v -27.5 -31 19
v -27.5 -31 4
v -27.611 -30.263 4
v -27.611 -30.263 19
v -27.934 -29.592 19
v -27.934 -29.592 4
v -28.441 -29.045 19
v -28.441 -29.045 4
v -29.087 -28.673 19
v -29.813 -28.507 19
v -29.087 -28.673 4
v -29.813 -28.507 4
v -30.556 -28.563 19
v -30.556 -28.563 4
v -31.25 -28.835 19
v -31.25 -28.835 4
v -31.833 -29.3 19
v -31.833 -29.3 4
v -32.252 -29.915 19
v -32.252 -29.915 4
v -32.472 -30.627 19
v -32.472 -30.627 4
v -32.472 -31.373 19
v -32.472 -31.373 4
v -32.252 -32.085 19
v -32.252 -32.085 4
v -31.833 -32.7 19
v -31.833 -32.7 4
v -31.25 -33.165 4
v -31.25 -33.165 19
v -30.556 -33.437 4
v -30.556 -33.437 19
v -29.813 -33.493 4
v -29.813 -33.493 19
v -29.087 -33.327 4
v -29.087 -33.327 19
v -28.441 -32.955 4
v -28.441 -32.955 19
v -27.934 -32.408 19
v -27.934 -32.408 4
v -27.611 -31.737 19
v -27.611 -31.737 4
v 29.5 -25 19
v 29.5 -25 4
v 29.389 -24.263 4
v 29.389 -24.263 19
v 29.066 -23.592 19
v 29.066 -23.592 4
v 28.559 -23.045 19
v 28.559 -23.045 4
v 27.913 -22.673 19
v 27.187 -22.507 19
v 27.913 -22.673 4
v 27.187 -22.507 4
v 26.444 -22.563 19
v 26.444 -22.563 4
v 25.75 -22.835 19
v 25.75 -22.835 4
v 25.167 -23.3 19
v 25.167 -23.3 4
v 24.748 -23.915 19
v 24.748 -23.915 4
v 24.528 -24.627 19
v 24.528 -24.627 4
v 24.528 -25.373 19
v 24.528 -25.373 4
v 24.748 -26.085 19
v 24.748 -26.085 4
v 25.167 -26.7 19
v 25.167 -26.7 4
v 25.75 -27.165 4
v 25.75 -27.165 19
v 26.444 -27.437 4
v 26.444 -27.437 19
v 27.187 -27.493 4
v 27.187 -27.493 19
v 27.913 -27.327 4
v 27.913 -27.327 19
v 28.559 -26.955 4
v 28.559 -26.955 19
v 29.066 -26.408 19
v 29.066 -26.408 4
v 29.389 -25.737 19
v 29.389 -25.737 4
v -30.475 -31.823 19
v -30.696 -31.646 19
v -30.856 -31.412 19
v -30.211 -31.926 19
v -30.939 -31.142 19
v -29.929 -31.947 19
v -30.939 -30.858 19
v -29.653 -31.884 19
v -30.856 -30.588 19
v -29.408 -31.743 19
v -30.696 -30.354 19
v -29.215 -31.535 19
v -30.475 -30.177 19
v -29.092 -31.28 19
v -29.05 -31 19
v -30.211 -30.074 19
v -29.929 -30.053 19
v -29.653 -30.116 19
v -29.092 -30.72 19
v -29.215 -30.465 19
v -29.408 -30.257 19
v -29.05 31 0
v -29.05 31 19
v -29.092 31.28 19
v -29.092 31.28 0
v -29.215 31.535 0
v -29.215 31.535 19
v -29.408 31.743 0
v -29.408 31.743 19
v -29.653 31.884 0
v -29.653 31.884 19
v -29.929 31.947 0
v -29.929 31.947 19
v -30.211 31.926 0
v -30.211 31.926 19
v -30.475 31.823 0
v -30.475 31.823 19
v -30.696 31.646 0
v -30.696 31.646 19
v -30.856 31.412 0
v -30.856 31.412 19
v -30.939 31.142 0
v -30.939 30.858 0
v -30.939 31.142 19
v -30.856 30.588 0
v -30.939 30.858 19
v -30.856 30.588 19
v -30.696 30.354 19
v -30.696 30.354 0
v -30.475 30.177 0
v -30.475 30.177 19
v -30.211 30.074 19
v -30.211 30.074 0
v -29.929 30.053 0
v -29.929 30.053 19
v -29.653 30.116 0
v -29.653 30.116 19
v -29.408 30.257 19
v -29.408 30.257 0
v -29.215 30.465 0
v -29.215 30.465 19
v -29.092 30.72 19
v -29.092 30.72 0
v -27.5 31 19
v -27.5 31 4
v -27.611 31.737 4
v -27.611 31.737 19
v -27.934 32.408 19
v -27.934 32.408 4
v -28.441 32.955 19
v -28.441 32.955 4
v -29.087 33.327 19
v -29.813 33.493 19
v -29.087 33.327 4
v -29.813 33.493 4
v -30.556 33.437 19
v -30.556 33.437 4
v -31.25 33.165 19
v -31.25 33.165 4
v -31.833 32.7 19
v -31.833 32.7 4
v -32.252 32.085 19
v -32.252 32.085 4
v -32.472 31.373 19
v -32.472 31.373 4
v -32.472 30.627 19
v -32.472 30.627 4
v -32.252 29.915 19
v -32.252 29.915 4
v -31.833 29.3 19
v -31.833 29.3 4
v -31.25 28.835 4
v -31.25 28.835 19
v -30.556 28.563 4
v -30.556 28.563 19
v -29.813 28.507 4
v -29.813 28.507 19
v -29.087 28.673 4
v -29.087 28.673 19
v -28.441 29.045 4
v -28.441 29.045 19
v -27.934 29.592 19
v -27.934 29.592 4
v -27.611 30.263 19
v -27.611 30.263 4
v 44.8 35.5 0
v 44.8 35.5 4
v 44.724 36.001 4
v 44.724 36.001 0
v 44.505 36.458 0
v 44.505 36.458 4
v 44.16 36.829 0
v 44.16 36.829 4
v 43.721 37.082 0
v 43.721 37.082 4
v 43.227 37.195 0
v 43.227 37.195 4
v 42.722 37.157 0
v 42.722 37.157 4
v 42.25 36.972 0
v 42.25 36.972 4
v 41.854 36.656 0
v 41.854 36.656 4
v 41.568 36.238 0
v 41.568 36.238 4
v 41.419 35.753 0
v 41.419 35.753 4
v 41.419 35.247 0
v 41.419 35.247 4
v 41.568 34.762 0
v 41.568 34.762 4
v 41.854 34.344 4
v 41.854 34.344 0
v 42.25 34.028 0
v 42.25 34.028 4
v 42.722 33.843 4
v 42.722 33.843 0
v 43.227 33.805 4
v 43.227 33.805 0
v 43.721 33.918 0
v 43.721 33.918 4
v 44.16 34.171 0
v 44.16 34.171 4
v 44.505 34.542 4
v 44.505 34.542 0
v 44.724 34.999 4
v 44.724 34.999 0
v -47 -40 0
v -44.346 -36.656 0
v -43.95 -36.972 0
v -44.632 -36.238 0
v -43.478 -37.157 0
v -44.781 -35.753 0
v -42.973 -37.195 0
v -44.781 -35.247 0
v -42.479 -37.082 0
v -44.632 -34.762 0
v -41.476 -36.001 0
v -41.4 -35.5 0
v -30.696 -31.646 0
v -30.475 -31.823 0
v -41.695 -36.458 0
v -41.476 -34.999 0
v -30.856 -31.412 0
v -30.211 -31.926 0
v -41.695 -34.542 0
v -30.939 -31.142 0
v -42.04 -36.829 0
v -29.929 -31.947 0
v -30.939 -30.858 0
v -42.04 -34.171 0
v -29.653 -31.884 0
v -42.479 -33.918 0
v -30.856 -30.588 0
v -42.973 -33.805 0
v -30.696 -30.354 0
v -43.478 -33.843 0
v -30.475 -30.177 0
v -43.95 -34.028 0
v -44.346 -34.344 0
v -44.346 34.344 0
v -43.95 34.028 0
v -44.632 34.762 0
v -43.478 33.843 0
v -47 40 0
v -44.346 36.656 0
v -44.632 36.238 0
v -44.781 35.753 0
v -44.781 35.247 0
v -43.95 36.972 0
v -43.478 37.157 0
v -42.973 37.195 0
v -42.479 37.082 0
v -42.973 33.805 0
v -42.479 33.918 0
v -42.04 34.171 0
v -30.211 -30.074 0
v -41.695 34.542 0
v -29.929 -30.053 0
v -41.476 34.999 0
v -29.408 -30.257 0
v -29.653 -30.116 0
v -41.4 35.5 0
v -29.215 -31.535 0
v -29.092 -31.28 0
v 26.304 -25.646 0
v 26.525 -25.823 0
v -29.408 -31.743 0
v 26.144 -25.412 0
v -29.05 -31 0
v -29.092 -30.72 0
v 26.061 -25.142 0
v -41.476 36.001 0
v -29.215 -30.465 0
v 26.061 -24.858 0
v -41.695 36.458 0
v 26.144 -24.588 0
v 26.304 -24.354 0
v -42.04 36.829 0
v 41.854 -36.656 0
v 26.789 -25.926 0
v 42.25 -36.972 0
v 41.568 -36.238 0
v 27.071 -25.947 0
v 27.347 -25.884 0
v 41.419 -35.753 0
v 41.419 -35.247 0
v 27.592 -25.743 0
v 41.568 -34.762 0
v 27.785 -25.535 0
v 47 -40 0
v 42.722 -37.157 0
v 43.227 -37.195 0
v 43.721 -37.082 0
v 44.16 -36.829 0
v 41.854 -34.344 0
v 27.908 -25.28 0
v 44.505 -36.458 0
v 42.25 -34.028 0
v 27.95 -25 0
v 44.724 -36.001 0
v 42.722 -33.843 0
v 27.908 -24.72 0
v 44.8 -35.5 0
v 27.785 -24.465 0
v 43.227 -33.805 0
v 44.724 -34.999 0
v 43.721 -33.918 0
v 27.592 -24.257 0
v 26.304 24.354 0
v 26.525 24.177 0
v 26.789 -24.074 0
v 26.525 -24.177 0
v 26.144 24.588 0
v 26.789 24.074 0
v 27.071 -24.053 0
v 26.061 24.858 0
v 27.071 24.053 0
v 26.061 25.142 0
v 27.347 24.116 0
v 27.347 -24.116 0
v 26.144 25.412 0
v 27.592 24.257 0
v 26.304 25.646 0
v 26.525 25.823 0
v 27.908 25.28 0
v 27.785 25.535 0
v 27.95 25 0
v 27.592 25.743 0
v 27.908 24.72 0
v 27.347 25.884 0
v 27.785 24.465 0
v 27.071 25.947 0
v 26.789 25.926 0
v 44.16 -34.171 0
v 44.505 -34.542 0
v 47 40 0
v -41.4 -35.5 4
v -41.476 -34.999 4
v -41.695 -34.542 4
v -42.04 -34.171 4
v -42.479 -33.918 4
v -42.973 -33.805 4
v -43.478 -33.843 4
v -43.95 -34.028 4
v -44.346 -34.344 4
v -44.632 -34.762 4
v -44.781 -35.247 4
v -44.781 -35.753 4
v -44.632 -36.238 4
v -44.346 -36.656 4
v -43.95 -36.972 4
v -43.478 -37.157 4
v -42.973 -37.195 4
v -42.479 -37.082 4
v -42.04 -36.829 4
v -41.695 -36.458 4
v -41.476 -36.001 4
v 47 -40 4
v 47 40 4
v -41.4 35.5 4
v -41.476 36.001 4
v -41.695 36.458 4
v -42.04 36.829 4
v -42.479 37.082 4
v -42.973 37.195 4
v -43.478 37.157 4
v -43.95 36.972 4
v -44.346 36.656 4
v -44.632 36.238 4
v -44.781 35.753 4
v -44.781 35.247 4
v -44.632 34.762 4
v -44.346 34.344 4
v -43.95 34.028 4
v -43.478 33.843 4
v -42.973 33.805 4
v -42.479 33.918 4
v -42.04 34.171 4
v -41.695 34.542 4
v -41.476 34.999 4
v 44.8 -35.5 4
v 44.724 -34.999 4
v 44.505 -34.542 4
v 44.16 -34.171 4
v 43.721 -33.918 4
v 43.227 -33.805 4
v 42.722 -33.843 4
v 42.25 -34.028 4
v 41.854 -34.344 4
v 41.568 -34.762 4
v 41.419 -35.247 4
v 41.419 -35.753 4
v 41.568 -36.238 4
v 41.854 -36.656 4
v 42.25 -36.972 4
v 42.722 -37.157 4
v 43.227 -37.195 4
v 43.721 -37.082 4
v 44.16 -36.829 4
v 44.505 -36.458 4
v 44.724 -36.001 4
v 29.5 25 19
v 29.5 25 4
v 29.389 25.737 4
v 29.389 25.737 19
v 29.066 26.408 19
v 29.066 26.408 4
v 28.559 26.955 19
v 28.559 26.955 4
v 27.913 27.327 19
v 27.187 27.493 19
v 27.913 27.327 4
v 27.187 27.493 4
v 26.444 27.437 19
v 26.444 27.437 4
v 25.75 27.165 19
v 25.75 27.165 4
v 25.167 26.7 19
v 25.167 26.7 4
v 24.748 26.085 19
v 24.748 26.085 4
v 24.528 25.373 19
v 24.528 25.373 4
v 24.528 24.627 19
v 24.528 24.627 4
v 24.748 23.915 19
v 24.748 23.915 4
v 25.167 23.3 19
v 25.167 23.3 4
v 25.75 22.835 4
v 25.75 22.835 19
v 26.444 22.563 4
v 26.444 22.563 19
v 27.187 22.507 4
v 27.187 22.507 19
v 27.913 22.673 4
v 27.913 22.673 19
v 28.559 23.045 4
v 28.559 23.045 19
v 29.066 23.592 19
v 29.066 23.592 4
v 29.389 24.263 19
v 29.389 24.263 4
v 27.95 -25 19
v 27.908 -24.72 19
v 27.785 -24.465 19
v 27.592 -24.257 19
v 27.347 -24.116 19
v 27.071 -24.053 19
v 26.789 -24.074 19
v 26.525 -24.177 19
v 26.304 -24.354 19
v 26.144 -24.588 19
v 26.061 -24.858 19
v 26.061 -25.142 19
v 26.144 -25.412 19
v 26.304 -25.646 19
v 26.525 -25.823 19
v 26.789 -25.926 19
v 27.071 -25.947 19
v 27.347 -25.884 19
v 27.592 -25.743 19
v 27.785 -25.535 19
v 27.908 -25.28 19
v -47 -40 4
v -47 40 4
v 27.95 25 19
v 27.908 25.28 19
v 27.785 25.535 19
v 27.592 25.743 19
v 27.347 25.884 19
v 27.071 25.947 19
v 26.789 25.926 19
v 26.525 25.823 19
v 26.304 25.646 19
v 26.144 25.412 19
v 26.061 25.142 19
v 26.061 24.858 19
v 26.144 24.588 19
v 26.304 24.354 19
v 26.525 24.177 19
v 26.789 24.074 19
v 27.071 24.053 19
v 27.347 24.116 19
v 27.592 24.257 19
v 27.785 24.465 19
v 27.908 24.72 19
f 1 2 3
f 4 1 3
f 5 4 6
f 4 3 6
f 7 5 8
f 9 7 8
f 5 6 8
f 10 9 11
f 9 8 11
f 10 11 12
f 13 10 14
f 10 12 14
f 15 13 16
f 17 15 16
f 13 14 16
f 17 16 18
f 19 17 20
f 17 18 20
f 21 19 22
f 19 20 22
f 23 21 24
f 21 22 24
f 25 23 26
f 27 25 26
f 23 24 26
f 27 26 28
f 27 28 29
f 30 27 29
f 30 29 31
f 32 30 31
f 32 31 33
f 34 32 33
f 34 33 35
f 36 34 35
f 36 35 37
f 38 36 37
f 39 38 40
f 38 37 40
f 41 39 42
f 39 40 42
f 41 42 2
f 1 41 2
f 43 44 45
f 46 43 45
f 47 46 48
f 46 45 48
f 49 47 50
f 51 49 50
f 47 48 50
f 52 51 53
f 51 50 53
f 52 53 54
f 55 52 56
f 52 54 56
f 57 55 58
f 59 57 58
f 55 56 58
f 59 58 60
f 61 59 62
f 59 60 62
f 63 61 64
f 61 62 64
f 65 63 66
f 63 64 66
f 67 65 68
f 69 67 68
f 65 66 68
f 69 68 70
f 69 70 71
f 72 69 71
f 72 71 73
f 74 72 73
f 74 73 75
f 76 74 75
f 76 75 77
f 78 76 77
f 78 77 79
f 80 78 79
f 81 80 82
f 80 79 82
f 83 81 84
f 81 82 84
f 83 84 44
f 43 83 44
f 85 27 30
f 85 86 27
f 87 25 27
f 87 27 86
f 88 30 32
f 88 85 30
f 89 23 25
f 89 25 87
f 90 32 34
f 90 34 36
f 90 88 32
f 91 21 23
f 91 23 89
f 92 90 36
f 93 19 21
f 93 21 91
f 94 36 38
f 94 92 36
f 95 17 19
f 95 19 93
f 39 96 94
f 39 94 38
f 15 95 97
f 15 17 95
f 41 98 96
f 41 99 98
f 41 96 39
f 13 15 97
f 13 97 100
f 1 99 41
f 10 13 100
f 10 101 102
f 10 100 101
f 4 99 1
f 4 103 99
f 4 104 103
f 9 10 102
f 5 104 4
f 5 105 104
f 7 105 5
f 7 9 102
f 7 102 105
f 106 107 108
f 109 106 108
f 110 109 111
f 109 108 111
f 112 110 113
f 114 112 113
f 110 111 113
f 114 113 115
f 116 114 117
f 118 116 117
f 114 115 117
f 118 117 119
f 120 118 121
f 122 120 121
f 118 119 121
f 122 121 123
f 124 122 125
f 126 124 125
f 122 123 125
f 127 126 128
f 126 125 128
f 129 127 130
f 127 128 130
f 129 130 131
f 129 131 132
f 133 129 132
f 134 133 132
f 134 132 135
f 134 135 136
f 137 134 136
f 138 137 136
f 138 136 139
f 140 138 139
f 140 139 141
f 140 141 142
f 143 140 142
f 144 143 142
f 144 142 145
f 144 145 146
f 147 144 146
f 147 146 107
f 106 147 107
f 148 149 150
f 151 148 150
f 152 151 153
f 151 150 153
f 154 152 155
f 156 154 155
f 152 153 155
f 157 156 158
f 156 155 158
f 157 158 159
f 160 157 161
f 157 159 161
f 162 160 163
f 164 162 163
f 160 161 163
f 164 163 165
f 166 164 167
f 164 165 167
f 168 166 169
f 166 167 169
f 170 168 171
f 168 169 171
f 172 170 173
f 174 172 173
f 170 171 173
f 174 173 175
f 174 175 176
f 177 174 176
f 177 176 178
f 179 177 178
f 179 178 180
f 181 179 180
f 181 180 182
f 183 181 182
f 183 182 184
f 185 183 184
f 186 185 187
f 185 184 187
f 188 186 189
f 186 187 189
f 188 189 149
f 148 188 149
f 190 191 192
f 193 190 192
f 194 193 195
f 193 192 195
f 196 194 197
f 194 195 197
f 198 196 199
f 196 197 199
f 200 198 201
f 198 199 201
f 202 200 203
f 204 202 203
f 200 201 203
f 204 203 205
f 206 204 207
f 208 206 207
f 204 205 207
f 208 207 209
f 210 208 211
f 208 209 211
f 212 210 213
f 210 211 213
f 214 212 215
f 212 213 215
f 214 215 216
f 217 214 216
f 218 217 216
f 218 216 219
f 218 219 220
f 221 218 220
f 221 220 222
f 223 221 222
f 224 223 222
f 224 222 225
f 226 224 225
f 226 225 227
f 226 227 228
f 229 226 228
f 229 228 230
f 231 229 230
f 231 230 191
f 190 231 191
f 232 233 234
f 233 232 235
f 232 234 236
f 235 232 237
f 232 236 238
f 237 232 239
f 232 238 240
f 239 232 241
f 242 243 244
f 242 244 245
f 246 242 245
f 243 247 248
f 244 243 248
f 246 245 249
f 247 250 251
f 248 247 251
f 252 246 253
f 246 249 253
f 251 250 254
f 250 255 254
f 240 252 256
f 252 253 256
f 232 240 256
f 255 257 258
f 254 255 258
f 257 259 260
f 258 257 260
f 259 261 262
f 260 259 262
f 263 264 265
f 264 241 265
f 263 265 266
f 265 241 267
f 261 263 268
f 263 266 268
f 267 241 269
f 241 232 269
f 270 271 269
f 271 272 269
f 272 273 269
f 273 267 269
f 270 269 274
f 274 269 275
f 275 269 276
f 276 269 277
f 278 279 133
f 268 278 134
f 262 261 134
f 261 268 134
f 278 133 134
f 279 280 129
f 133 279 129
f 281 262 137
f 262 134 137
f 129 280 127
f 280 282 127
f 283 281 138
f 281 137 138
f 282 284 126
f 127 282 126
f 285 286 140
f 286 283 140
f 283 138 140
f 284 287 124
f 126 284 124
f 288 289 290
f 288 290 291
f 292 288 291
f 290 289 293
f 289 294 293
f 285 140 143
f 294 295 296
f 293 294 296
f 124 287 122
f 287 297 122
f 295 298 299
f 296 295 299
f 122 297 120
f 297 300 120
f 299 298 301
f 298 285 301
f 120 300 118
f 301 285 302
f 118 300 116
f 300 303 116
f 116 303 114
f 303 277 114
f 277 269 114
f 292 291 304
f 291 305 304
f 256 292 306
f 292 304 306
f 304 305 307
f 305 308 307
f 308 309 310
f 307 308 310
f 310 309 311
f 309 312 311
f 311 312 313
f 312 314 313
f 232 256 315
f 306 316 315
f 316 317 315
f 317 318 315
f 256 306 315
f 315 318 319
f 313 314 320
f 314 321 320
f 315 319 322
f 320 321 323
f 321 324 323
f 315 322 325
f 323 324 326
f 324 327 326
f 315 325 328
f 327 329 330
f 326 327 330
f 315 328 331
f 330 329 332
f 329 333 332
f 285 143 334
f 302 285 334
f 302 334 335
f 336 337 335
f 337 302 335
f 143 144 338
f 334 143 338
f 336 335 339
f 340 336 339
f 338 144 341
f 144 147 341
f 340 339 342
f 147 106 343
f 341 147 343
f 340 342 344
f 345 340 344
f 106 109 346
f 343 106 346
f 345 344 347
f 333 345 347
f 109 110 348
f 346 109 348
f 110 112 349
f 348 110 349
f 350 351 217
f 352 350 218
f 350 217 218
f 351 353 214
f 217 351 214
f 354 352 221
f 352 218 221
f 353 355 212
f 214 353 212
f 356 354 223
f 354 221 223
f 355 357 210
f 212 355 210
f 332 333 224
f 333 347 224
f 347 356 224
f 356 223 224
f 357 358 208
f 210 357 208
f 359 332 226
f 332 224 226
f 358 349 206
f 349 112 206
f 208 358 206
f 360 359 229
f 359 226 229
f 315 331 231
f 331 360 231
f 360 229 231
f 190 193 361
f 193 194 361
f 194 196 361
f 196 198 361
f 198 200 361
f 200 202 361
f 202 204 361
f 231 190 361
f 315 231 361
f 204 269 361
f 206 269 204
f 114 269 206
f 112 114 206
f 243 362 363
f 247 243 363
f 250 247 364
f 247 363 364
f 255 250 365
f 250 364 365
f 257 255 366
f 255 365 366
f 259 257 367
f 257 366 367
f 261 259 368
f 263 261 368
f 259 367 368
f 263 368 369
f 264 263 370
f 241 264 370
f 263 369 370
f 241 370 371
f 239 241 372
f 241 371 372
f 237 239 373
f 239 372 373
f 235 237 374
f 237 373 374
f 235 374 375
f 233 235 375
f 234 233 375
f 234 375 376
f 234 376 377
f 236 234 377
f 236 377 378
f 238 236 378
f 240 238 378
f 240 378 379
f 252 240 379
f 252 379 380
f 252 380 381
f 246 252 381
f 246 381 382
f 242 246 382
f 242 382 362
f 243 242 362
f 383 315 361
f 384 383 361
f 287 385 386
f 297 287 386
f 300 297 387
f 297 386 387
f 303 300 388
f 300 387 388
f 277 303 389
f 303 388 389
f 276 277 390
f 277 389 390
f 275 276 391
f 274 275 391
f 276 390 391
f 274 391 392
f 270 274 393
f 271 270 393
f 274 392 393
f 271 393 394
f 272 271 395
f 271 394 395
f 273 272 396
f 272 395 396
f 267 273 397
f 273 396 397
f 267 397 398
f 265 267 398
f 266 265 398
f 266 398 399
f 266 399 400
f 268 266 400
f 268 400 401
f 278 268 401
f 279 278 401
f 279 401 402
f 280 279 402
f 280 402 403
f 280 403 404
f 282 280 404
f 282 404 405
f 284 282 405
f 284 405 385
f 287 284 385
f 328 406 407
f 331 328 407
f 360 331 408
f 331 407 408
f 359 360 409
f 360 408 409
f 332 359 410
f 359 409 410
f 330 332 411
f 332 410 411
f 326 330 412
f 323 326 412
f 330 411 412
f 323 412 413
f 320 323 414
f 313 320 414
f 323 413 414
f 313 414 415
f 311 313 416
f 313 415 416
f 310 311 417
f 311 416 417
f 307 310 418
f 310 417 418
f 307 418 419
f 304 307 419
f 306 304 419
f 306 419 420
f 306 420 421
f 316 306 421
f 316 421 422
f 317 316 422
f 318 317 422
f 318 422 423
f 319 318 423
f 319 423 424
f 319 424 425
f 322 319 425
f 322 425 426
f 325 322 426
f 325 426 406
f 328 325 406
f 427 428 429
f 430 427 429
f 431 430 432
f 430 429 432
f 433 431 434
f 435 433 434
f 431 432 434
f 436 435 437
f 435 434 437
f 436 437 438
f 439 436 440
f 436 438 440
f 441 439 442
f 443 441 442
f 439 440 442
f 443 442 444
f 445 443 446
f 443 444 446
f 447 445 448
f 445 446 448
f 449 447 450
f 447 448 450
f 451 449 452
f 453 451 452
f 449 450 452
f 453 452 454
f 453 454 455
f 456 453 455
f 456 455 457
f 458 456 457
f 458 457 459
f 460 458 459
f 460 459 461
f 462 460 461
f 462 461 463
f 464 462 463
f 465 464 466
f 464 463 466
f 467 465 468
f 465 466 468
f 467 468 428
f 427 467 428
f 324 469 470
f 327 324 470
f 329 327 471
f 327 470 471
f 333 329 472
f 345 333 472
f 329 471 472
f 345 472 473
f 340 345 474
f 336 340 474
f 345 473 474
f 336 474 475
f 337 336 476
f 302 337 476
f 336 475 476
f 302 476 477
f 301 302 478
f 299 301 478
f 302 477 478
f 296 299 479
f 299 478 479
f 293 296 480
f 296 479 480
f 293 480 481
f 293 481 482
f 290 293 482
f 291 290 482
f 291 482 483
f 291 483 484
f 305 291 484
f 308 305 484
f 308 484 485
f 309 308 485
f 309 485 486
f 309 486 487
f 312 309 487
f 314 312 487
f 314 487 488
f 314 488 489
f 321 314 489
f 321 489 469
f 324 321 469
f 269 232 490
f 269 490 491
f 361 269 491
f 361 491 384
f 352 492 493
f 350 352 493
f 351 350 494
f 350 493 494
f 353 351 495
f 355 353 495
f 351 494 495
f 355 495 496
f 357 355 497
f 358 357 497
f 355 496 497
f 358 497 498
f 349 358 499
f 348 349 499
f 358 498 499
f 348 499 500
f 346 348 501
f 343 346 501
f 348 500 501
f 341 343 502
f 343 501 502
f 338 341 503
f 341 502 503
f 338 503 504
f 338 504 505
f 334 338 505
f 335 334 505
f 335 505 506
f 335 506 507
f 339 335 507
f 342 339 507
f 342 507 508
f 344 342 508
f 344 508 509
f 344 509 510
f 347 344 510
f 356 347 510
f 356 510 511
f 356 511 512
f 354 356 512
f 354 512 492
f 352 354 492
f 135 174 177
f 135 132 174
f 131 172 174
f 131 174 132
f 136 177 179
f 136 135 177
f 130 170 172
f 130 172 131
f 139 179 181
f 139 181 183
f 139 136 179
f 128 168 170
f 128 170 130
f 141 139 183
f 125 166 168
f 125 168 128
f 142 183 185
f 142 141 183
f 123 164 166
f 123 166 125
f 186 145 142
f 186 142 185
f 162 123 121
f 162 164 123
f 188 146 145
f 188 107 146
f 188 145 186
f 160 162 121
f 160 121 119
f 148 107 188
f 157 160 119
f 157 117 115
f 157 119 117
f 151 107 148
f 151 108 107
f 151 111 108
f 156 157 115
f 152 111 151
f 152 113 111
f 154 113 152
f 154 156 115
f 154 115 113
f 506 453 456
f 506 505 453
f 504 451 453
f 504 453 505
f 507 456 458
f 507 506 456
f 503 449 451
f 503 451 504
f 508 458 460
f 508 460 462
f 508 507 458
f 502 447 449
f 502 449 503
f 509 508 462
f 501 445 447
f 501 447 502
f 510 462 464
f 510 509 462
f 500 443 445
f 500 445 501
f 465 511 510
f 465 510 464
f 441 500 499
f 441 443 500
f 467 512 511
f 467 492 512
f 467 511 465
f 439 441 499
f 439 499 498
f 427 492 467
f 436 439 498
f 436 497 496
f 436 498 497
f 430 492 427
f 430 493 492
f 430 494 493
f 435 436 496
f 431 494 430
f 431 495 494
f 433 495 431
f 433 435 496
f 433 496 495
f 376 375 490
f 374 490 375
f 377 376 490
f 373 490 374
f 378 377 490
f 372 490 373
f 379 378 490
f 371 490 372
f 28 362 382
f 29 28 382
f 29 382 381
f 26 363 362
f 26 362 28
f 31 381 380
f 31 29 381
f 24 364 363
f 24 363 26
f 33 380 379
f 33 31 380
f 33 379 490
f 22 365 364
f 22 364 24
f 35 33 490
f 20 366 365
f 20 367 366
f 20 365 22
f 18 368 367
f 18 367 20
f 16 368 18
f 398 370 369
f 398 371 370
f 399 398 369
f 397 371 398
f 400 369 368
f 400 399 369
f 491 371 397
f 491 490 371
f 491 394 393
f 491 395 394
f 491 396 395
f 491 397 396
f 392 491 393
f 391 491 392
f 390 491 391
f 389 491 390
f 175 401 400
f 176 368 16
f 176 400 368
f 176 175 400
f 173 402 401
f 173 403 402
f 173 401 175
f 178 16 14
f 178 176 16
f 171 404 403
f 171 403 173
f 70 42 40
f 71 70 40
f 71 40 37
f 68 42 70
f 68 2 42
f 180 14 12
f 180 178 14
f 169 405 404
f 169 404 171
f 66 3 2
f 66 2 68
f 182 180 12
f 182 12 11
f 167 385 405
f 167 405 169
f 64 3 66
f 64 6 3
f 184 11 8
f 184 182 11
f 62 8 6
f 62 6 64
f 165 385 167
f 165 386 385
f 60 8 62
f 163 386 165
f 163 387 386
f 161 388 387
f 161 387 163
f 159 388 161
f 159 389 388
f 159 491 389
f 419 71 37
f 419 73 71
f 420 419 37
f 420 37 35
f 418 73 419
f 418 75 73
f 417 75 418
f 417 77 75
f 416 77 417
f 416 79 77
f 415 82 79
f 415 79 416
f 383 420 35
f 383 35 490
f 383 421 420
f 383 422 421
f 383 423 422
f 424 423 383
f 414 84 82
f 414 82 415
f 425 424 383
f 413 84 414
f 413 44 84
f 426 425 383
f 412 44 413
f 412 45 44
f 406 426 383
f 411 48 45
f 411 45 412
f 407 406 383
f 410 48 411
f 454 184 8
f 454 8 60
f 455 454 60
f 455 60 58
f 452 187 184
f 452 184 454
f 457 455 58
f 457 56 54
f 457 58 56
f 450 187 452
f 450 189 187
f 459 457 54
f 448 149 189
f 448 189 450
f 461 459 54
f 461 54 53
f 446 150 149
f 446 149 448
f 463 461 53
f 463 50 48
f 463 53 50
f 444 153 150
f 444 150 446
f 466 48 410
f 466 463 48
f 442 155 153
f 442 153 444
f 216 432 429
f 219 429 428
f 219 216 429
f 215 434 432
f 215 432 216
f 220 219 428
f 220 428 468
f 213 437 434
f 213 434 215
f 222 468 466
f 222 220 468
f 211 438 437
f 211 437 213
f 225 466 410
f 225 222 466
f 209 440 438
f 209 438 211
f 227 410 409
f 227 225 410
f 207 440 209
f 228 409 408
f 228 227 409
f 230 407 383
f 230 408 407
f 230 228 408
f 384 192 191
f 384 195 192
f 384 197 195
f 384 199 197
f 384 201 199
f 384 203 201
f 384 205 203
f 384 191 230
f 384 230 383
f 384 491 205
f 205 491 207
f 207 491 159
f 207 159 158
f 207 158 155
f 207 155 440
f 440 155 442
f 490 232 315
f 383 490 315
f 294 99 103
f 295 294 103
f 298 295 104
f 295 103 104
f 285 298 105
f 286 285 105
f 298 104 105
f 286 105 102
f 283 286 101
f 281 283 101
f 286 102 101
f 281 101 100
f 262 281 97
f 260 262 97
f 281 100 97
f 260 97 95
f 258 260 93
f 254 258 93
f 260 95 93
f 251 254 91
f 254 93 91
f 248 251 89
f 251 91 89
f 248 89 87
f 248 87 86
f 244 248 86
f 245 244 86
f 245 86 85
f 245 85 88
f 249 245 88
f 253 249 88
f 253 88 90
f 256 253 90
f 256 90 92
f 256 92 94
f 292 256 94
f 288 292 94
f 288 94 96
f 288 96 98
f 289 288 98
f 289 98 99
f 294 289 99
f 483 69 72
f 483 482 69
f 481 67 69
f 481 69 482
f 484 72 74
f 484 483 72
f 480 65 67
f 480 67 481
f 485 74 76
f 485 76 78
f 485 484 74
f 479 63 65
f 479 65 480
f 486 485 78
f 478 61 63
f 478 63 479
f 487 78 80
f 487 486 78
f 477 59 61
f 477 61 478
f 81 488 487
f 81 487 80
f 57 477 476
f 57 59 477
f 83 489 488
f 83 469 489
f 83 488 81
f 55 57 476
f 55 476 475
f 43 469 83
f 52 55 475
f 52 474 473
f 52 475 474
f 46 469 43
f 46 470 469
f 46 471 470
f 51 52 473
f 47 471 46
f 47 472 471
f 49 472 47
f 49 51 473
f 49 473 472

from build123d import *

# Parameters (mm, degrees)
SKETCH_1_W          = 94
SKETCH_1_H          = 80
EXTRUDE_1_DEPTH     = 4
CUT_EXTRUDE_1_REACH = 63.847
SKETCH_2_R          = 1.7
SKETCH_3_R          = 2.5
EXTRUDE_2_DEPTH     = 15
CUT_EXTRUDE_2_REACH = 66.576
SKETCH_4_R          = 0.95


with BuildPart() as part:
    # 草图1 → 凸台-拉伸1 (new body)
    with BuildSketch(Plane.XY):
        Rectangle(SKETCH_1_W, SKETCH_1_H)
    extrude(amount=EXTRUDE_1_DEPTH)

    # 草图2 → 切除-拉伸1 (cut, up to next)
    with BuildSketch(Plane.XY.offset(4), mode=Mode.PRIVATE) as cut_extrude_1_sk1:
        with Locations((-43.1, -35.5)):
            Circle(SKETCH_2_R)
    cut_extrude_1_tool1 = extrude(cut_extrude_1_sk1.sketch, amount=-CUT_EXTRUDE_1_REACH, mode=Mode.PRIVATE) & part.part
    # 草图2 → 切除-拉伸1 (cut, up to next)
    with BuildSketch(Plane.XY.offset(4), mode=Mode.PRIVATE) as cut_extrude_1_sk2:
        with Locations((43.1, -35.5)):
            Circle(SKETCH_2_R)
    cut_extrude_1_tool2 = extrude(cut_extrude_1_sk2.sketch, amount=-CUT_EXTRUDE_1_REACH, mode=Mode.PRIVATE) & part.part
    # 草图2 → 切除-拉伸1 (cut, up to next)
    with BuildSketch(Plane.XY.offset(4), mode=Mode.PRIVATE) as cut_extrude_1_sk3:
        with Locations((43.1, 35.5)):
            Circle(SKETCH_2_R)
    cut_extrude_1_tool3 = extrude(cut_extrude_1_sk3.sketch, amount=-CUT_EXTRUDE_1_REACH, mode=Mode.PRIVATE) & part.part
    # 草图2 → 切除-拉伸1 (cut, up to next)
    with BuildSketch(Plane.XY.offset(4), mode=Mode.PRIVATE) as cut_extrude_1_sk4:
        with Locations((-43.1, 35.5)):
            Circle(SKETCH_2_R)
    cut_extrude_1_tool4 = extrude(cut_extrude_1_sk4.sketch, amount=-CUT_EXTRUDE_1_REACH, mode=Mode.PRIVATE) & part.part
    add(cut_extrude_1_tool1.solids().sort_by_distance((-43.1, -35.5, 4))[0], mode=Mode.SUBTRACT)
    add(cut_extrude_1_tool2.solids().sort_by_distance((43.1, -35.5, 4))[0], mode=Mode.SUBTRACT)
    add(cut_extrude_1_tool3.solids().sort_by_distance((43.1, 35.5, 4))[0], mode=Mode.SUBTRACT)
    add(cut_extrude_1_tool4.solids().sort_by_distance((-43.1, 35.5, 4))[0], mode=Mode.SUBTRACT)

    # 草图3 → 凸台-拉伸2 (add)
    with BuildSketch(Plane.XY.offset(4)):
        with Locations((-30, 31)):
            Circle(SKETCH_3_R)
        with Locations((-30, -31)):
            Circle(SKETCH_3_R)
        with Locations((27, 25)):
            Circle(SKETCH_3_R)
        with Locations((27, -25)):
            Circle(SKETCH_3_R)
    extrude(amount=EXTRUDE_2_DEPTH)

    # 草图4 → 切除-拉伸2 (cut, up to next)
    with BuildSketch(Plane.XY.offset(19), mode=Mode.PRIVATE) as cut_extrude_2_sk1:
        with Locations((-30, 31)):
            Circle(SKETCH_4_R)
    cut_extrude_2_tool1 = extrude(cut_extrude_2_sk1.sketch, amount=-CUT_EXTRUDE_2_REACH, mode=Mode.PRIVATE) & part.part
    # 草图4 → 切除-拉伸2 (cut, up to next)
    with BuildSketch(Plane.XY.offset(19), mode=Mode.PRIVATE) as cut_extrude_2_sk2:
        with Locations((27, 25)):
            Circle(SKETCH_4_R)
    cut_extrude_2_tool2 = extrude(cut_extrude_2_sk2.sketch, amount=-CUT_EXTRUDE_2_REACH, mode=Mode.PRIVATE) & part.part
    # 草图4 → 切除-拉伸2 (cut, up to next)
    with BuildSketch(Plane.XY.offset(19), mode=Mode.PRIVATE) as cut_extrude_2_sk3:
        with Locations((-30, -31)):
            Circle(SKETCH_4_R)
    cut_extrude_2_tool3 = extrude(cut_extrude_2_sk3.sketch, amount=-CUT_EXTRUDE_2_REACH, mode=Mode.PRIVATE) & part.part
    # 草图4 → 切除-拉伸2 (cut, up to next)
    with BuildSketch(Plane.XY.offset(19), mode=Mode.PRIVATE) as cut_extrude_2_sk4:
        with Locations((27, -25)):
            Circle(SKETCH_4_R)
    cut_extrude_2_tool4 = extrude(cut_extrude_2_sk4.sketch, amount=-CUT_EXTRUDE_2_REACH, mode=Mode.PRIVATE) & part.part
    add(cut_extrude_2_tool1.solids().sort_by_distance((-30, 31, 19))[0], mode=Mode.SUBTRACT)
    add(cut_extrude_2_tool2.solids().sort_by_distance((27, 25, 19))[0], mode=Mode.SUBTRACT)
    add(cut_extrude_2_tool3.solids().sort_by_distance((-30, -31, 19))[0], mode=Mode.SUBTRACT)
    add(cut_extrude_2_tool4.solids().sort_by_distance((27, -25, 19))[0], mode=Mode.SUBTRACT)


solid = part.part
